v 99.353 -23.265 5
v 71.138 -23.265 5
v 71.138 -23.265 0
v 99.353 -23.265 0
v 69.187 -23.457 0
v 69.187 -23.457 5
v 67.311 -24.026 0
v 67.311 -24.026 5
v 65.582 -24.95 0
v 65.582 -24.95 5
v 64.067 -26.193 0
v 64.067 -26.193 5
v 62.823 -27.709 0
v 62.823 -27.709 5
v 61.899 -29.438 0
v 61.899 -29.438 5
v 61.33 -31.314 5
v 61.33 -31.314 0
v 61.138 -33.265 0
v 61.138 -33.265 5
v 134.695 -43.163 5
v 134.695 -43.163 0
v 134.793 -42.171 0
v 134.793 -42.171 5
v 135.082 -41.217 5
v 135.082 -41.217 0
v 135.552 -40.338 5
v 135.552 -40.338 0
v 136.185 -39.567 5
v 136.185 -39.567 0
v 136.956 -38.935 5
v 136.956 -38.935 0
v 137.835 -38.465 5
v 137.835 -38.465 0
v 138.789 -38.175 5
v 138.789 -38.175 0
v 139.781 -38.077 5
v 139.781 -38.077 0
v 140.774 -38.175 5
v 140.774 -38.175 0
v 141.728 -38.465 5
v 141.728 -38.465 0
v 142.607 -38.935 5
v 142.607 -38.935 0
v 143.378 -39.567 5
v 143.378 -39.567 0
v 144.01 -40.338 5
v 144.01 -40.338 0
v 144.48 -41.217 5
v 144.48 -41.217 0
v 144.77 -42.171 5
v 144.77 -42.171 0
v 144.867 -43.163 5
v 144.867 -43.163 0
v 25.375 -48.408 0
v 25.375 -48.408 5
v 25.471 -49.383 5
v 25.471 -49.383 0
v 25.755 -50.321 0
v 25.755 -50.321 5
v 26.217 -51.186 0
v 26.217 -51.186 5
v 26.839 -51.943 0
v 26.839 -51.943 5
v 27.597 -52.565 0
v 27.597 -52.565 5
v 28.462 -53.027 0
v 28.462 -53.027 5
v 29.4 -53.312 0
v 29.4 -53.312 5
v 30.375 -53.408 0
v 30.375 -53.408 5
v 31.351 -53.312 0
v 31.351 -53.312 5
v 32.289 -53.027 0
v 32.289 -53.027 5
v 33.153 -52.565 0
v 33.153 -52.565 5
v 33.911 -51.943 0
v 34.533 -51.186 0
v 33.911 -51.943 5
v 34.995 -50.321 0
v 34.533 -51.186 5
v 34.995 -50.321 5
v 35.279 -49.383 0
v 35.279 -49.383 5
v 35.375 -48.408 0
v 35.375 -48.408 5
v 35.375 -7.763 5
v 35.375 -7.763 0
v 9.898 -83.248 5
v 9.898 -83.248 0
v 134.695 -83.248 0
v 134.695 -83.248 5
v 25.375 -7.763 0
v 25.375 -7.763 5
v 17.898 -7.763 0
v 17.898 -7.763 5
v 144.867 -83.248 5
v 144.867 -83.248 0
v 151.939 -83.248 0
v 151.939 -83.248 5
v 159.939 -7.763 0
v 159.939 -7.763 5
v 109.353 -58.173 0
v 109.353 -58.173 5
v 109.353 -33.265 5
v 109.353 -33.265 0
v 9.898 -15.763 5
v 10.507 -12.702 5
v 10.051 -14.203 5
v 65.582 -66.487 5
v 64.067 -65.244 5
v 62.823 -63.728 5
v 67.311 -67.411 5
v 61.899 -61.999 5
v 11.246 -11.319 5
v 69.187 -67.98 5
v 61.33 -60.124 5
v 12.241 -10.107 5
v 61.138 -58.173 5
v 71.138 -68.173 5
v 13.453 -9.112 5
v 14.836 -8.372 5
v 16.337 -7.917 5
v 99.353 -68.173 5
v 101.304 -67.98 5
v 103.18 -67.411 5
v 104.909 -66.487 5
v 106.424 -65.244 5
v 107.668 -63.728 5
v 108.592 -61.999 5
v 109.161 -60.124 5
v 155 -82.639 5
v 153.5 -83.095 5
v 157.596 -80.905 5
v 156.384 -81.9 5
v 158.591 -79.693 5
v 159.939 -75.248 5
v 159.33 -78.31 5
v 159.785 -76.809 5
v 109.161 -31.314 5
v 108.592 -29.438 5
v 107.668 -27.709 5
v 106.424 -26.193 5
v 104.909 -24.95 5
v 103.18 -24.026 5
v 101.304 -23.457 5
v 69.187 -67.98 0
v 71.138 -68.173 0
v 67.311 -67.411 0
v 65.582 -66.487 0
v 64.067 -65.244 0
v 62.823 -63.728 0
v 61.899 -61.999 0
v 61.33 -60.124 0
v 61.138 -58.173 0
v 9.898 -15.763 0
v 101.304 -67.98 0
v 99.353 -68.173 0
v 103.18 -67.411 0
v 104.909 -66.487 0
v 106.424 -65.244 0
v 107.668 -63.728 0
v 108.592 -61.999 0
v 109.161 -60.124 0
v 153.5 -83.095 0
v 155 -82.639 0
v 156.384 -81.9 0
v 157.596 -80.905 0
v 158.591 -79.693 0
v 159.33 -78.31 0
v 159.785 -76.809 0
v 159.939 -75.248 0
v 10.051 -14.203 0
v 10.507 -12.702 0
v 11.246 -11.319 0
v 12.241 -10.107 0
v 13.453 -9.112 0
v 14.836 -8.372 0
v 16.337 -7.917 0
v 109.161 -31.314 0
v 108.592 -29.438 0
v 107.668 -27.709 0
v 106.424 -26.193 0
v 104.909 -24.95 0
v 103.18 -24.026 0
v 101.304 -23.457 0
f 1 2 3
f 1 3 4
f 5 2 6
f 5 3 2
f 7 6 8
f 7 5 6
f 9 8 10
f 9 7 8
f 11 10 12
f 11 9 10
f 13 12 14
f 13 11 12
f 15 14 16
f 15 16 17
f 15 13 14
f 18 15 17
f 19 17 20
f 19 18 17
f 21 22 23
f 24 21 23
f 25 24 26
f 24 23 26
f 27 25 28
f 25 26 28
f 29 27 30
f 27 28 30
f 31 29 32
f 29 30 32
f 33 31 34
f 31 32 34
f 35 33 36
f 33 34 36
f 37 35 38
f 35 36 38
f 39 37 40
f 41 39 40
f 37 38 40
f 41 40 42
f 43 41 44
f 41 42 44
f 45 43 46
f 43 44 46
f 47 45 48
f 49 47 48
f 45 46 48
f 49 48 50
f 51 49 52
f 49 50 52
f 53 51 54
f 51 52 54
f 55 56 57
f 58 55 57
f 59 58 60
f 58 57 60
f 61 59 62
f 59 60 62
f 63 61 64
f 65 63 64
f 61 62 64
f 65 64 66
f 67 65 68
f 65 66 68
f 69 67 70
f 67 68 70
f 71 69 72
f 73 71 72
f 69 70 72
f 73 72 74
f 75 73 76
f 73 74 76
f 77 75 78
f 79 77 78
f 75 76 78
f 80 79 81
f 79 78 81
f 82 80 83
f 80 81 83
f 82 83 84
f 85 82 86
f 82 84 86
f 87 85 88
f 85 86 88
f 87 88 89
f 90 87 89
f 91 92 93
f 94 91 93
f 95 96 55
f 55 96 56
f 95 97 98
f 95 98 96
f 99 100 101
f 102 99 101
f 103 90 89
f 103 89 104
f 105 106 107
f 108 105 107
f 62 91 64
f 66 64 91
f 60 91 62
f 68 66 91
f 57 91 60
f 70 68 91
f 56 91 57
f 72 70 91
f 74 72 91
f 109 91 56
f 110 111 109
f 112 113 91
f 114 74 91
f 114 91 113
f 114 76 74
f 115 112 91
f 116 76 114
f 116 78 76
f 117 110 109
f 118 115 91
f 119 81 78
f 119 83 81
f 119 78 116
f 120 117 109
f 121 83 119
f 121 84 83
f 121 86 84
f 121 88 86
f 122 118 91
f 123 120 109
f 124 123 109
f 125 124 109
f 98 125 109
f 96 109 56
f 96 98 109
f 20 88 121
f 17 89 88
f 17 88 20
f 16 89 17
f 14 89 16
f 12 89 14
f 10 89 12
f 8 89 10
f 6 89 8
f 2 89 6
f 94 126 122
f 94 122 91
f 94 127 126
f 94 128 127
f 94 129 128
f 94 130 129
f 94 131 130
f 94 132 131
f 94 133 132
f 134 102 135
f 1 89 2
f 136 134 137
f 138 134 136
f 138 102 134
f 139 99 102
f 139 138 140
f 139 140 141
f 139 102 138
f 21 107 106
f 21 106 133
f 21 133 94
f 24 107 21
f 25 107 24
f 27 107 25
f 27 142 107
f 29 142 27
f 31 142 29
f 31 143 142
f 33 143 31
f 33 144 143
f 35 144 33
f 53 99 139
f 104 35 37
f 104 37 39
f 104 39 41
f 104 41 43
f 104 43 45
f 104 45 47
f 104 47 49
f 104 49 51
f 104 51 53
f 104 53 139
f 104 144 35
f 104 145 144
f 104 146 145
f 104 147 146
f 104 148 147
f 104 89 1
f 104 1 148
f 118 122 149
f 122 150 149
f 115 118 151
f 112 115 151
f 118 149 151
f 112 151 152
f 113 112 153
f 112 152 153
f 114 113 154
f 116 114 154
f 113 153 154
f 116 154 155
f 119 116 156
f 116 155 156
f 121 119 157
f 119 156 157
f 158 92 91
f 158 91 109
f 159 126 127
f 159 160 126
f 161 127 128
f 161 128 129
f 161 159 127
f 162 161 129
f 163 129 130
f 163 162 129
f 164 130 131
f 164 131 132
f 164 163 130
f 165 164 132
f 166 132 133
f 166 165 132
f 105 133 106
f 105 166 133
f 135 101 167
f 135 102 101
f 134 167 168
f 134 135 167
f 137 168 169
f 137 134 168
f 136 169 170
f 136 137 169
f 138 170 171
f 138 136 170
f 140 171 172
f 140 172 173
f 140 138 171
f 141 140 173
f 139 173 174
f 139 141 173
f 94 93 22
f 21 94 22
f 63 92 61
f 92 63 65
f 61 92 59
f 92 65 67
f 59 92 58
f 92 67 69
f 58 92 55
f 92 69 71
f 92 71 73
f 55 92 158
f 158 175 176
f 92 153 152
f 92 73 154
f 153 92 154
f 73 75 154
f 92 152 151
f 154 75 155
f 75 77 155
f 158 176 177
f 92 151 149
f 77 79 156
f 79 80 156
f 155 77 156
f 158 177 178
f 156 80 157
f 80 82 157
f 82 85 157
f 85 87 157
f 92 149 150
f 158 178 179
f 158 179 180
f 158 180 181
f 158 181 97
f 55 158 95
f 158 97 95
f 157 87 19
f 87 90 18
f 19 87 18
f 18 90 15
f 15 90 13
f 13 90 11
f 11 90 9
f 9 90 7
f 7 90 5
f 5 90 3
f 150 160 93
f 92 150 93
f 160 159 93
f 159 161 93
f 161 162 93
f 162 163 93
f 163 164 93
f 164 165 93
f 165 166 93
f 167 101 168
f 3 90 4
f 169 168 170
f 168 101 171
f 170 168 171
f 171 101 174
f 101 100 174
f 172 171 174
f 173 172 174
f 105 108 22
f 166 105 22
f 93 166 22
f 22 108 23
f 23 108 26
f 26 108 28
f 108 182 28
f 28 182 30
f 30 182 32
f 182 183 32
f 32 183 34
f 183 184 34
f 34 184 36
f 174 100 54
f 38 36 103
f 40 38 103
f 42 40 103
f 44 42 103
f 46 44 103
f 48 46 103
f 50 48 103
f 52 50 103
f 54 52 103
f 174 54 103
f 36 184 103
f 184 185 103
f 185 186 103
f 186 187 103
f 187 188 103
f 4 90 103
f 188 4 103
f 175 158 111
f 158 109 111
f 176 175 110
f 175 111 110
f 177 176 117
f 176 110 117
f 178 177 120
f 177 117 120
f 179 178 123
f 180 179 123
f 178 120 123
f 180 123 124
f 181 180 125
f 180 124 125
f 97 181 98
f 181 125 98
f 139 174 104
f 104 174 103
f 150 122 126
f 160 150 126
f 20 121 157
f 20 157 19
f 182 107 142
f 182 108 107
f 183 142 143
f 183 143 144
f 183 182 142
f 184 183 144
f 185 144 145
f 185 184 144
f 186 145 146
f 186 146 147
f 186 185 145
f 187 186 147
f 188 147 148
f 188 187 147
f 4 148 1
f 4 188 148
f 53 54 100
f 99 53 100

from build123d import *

# Parameters (mm, degrees)
F0_W     = 150.041418
F0_H     = 75.48475
F1_DEPTH = 5
F3_DEPTH = 9.8
F5_DEPTH = 15.9
F6_W     = 48.215222
F6_H     = 44.908039
F7_DEPTH = 12.5
F8_R     = 10
F9_R     = 8


with BuildPart() as f1:
    # F0 (on Top) → F1 (new body)
    with BuildSketch(Plane.XY):
        with Locations((84.918297, -45.505845)):
            Rectangle(F0_W, F0_H)
    extrude(amount=F1_DEPTH)

    # F2 (on face) → F3 (cut)
    with BuildSketch(Plane(origin=(0, 0, 0), x_dir=(1, 0, 0), z_dir=(0, 0, -1))):
        Polygon((144.867465, 78.199215), (144.867465, 83.24822), (134.695292, 83.24822), (134.695292, 43.163463), (144.867465, 43.163463), align=None)
        with BuildLine():
            ThreePointArc((134.695292, 43.163463), (139.781378, 38.077377), (144.867465, 43.163463))
            Line((144.867465, 43.163463), (134.695292, 43.163463))
        make_face()
    extrude(amount=-F3_DEPTH, mode=Mode.SUBTRACT)

    # F4 (on face) → F5 (cut)
    with BuildSketch(Plane.XY.offset(5)):
        Polygon((35.375342, -7.76347), (25.374779, -7.76347), (25.374779, -10.515515), (25.374779, -48.407745), (35.375342, -48.407745), align=None)
        with BuildLine():
            Line((35.375342, -48.407745), (25.374779, -48.407745))
            ThreePointArc((25.374779, -48.407745), (30.375061, -53.408026), (35.375342, -48.407745))
        make_face()
    extrude(amount=-F5_DEPTH, mode=Mode.SUBTRACT)

    # F6 (on face) → F7 (cut)
    with BuildSketch(Plane.XY.offset(5)):
        with Locations((85.245358, -45.718584)):
            Rectangle(F6_W, F6_H)
    extrude(amount=-F7_DEPTH, mode=Mode.SUBTRACT)

    # F8
    f8_edges = [f1.edges().sort_by_distance(p)[0] for p in [
        (109.352969, -23.264565, 2.5),
        (61.137747, -68.172604, 2.5),
        (109.352969, -68.172604, 2.5),
        (61.137747, -23.264565, 2.5),
    ]]
    fillet(f8_edges, radius=F8_R)

    # F9
    f9_edges = [f1.edges().sort_by_distance(p)[0] for p in [
        (9.897588, -7.76347, 2.5),
        (159.939006, -83.24822, 2.5),
    ]]
    fillet(f9_edges, radius=F9_R)


solid = f1.part
